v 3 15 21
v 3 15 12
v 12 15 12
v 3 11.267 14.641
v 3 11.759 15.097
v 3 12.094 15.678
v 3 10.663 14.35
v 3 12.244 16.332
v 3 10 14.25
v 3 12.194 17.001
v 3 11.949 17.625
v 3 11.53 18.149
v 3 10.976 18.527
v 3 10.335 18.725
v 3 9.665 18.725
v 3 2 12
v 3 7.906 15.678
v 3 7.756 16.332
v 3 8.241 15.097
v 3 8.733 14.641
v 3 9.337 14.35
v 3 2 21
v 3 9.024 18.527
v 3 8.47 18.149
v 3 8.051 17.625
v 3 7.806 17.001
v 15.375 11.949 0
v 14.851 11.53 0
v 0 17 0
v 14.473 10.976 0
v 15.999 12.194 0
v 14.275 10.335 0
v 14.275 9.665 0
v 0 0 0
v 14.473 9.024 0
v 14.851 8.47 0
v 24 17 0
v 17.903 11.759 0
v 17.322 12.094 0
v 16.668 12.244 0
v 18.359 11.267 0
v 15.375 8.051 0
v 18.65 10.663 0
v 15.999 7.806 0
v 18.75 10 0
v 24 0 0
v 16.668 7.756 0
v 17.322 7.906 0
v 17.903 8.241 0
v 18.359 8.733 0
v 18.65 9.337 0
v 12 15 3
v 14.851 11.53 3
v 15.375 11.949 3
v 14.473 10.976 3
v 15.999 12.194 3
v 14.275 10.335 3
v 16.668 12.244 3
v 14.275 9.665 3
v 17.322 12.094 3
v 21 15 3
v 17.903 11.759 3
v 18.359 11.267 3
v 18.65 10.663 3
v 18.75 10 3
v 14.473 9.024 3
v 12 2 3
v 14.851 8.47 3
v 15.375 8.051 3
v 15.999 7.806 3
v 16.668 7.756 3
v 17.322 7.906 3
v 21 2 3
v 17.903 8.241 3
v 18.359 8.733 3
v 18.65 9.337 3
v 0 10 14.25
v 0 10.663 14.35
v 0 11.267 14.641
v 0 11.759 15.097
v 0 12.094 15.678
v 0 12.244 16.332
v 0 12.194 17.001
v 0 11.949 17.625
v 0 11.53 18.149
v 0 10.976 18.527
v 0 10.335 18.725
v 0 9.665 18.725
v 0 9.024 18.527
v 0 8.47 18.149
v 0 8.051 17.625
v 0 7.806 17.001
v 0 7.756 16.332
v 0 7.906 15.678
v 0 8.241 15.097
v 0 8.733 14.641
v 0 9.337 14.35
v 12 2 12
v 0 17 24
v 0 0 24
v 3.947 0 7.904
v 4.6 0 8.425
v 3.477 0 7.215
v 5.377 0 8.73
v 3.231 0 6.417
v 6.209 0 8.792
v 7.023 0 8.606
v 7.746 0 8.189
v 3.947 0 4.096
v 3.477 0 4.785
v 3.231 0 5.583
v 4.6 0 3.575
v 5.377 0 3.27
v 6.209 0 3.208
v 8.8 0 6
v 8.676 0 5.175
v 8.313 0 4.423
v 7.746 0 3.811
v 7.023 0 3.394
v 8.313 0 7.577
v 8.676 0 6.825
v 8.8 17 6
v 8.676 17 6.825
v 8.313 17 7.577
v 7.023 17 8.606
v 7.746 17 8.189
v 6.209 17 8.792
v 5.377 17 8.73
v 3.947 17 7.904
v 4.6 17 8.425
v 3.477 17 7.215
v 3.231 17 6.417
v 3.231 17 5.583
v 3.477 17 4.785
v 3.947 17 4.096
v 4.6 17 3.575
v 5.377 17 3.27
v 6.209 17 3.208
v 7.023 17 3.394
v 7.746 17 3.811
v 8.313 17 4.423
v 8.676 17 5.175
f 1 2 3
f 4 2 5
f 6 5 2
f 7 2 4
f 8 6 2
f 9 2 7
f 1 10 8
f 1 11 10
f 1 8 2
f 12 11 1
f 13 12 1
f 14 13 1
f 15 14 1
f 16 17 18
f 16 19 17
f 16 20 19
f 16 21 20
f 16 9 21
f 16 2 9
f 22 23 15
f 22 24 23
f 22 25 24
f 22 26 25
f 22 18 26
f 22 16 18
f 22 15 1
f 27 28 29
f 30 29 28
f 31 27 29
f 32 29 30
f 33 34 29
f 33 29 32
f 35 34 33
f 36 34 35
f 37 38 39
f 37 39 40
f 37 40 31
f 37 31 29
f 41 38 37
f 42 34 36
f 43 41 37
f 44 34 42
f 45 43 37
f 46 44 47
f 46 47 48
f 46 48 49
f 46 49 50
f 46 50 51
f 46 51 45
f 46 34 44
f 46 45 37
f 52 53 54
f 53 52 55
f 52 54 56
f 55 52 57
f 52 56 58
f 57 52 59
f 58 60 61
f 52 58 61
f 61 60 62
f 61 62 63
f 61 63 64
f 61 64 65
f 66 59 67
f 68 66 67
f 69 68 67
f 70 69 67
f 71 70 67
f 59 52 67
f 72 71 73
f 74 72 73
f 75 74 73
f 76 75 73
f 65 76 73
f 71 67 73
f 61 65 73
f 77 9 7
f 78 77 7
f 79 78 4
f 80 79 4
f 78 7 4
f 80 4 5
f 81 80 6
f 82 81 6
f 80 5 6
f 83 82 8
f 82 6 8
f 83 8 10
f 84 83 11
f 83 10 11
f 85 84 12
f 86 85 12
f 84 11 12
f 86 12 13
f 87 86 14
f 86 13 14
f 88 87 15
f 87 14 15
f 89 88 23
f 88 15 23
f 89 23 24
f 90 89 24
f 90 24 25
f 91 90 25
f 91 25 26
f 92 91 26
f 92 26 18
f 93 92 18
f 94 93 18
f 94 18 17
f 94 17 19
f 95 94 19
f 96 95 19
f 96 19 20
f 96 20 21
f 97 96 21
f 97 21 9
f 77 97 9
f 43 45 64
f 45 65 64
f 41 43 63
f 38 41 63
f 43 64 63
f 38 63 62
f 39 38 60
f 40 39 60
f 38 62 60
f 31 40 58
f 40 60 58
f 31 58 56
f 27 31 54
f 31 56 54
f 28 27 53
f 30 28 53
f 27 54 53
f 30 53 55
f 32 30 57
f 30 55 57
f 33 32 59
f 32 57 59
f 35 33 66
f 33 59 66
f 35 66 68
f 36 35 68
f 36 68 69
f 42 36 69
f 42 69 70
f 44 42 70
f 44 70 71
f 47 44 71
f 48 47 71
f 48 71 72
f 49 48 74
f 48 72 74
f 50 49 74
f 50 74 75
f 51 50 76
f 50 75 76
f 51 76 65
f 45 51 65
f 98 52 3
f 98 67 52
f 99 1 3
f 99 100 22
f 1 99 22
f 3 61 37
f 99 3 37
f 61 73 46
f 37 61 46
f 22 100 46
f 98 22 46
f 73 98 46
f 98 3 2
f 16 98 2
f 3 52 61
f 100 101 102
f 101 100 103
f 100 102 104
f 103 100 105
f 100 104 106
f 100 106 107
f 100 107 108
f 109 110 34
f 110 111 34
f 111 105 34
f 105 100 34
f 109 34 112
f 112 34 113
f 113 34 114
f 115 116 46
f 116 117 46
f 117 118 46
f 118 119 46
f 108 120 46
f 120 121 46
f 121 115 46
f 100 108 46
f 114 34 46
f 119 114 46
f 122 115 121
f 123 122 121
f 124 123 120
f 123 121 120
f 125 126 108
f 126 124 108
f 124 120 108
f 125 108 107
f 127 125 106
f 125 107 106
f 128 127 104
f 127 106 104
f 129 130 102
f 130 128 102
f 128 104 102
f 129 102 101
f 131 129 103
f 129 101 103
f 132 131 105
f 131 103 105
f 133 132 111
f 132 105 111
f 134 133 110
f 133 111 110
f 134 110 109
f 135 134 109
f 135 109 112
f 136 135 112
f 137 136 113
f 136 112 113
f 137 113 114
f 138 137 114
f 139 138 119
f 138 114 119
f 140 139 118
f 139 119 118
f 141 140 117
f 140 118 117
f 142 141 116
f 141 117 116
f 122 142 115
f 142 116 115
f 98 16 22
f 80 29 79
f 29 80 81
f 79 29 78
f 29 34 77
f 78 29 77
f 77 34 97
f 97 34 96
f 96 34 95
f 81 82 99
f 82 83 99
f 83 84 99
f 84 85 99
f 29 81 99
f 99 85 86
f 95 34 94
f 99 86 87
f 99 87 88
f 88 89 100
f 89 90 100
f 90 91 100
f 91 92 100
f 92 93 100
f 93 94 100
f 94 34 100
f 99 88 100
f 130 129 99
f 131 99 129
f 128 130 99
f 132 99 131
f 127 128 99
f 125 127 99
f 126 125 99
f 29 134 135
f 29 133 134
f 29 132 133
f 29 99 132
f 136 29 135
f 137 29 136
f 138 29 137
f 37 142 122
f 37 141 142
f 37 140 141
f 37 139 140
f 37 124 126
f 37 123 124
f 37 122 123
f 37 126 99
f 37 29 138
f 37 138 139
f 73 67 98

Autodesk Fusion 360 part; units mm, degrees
sketch "Sketch1" plane through (0, 0, 0) normal (0, 1, 0) x (1, 0, 0)
  line L0 (0, 0) -> (24, 0)
  line L1 (0, 0) -> (0, -24)
  circle A0 centre (6, -6) radius 2.8
  line L2 (0, -24) -> (24, 0)
  line L3 (0, 0) -> (12, 0)
  line L4 (12, 0) -> (12, -12)
  line L5 (12, -12) -> (0, -12)
  line L6 (0, -12) -> (0, 0)
  line L7 (3, 0) -> (3, -23)
  line L8 (3, -3) -> (21, -3)
  dimension "d3" = 5.6
  dimension "d4" = 6
  dimension "d5" = 6
  dimension "d6" = 12
  dimension "d7" = 12
  dimension "d14" = 3
  dimension "d15" = 3
extrude "Extrude1" add sketch "Sketch1" along normal blind 17 contours L0 L1 L3 L5 L6 L7 | L0 L3 L4 L7 L8 | L4 L5 L7 L8
extrude "Extrude2" add sketch "Sketch1" along normal blind 2 contours L1 L2 L5 L7 | L0 L2 L4 L8 | L2 L5 L7 | L2 L4 L8
extrude "Extrude3" add sketch "Sketch1" along normal blind 17 contours L1 L2 L5 L7 | L0 L2 L4 L8
extrude "Extrude4" add sketch "Sketch1" against normal blind 2 from surface at 17 contours L2 L5 L7 | L2 L4 L8
sketch "Sketch2" plane through (0, 0, 3) normal (0, 0, 1) x (1, 0, 0)
  line L0 (21, 15) -> (12, 15)
  line L1 (12, 15) -> (12, 2)
  line L2 (12, 2) -> (21, 2)
  line L3 (21, 2) -> (21, 15)
  line L4 (12, 10) -> (21, 10) construction
  circle A0 centre (16.5, 10) radius 2.25
  point P0 (12, 10)
  point P1 (12, 8.5)
  dimension "d21" = 1.5
  dimension "d22" = 4.5
extrude "Extrude5" cut sketch "Sketch2" against normal through all contours A0
sketch "Sketch3" plane through (3, 0, 0) normal (1, 0, 0) x (0, 0, -1)
  line L0 (-12, 15) -> (-21, 15)
  line L1 (-21, 15) -> (-21, 2)
  line L2 (-21, 2) -> (-12, 2)
  line L3 (-12, 2) -> (-12, 15)
  line L4 (-12, 10) -> (-21, 10) construction
  circle A0 centre (-16.5, 10) radius 2.25
  point P0 (-12, 8.5)
  point P1 (-12, 10)
  dimension "d25" = 1.5
  dimension "d26" = 4.5
extrude "Extrude6" cut sketch "Sketch3" against normal through all contours A0
equation "d8 = 20 mm - 3 mm"
